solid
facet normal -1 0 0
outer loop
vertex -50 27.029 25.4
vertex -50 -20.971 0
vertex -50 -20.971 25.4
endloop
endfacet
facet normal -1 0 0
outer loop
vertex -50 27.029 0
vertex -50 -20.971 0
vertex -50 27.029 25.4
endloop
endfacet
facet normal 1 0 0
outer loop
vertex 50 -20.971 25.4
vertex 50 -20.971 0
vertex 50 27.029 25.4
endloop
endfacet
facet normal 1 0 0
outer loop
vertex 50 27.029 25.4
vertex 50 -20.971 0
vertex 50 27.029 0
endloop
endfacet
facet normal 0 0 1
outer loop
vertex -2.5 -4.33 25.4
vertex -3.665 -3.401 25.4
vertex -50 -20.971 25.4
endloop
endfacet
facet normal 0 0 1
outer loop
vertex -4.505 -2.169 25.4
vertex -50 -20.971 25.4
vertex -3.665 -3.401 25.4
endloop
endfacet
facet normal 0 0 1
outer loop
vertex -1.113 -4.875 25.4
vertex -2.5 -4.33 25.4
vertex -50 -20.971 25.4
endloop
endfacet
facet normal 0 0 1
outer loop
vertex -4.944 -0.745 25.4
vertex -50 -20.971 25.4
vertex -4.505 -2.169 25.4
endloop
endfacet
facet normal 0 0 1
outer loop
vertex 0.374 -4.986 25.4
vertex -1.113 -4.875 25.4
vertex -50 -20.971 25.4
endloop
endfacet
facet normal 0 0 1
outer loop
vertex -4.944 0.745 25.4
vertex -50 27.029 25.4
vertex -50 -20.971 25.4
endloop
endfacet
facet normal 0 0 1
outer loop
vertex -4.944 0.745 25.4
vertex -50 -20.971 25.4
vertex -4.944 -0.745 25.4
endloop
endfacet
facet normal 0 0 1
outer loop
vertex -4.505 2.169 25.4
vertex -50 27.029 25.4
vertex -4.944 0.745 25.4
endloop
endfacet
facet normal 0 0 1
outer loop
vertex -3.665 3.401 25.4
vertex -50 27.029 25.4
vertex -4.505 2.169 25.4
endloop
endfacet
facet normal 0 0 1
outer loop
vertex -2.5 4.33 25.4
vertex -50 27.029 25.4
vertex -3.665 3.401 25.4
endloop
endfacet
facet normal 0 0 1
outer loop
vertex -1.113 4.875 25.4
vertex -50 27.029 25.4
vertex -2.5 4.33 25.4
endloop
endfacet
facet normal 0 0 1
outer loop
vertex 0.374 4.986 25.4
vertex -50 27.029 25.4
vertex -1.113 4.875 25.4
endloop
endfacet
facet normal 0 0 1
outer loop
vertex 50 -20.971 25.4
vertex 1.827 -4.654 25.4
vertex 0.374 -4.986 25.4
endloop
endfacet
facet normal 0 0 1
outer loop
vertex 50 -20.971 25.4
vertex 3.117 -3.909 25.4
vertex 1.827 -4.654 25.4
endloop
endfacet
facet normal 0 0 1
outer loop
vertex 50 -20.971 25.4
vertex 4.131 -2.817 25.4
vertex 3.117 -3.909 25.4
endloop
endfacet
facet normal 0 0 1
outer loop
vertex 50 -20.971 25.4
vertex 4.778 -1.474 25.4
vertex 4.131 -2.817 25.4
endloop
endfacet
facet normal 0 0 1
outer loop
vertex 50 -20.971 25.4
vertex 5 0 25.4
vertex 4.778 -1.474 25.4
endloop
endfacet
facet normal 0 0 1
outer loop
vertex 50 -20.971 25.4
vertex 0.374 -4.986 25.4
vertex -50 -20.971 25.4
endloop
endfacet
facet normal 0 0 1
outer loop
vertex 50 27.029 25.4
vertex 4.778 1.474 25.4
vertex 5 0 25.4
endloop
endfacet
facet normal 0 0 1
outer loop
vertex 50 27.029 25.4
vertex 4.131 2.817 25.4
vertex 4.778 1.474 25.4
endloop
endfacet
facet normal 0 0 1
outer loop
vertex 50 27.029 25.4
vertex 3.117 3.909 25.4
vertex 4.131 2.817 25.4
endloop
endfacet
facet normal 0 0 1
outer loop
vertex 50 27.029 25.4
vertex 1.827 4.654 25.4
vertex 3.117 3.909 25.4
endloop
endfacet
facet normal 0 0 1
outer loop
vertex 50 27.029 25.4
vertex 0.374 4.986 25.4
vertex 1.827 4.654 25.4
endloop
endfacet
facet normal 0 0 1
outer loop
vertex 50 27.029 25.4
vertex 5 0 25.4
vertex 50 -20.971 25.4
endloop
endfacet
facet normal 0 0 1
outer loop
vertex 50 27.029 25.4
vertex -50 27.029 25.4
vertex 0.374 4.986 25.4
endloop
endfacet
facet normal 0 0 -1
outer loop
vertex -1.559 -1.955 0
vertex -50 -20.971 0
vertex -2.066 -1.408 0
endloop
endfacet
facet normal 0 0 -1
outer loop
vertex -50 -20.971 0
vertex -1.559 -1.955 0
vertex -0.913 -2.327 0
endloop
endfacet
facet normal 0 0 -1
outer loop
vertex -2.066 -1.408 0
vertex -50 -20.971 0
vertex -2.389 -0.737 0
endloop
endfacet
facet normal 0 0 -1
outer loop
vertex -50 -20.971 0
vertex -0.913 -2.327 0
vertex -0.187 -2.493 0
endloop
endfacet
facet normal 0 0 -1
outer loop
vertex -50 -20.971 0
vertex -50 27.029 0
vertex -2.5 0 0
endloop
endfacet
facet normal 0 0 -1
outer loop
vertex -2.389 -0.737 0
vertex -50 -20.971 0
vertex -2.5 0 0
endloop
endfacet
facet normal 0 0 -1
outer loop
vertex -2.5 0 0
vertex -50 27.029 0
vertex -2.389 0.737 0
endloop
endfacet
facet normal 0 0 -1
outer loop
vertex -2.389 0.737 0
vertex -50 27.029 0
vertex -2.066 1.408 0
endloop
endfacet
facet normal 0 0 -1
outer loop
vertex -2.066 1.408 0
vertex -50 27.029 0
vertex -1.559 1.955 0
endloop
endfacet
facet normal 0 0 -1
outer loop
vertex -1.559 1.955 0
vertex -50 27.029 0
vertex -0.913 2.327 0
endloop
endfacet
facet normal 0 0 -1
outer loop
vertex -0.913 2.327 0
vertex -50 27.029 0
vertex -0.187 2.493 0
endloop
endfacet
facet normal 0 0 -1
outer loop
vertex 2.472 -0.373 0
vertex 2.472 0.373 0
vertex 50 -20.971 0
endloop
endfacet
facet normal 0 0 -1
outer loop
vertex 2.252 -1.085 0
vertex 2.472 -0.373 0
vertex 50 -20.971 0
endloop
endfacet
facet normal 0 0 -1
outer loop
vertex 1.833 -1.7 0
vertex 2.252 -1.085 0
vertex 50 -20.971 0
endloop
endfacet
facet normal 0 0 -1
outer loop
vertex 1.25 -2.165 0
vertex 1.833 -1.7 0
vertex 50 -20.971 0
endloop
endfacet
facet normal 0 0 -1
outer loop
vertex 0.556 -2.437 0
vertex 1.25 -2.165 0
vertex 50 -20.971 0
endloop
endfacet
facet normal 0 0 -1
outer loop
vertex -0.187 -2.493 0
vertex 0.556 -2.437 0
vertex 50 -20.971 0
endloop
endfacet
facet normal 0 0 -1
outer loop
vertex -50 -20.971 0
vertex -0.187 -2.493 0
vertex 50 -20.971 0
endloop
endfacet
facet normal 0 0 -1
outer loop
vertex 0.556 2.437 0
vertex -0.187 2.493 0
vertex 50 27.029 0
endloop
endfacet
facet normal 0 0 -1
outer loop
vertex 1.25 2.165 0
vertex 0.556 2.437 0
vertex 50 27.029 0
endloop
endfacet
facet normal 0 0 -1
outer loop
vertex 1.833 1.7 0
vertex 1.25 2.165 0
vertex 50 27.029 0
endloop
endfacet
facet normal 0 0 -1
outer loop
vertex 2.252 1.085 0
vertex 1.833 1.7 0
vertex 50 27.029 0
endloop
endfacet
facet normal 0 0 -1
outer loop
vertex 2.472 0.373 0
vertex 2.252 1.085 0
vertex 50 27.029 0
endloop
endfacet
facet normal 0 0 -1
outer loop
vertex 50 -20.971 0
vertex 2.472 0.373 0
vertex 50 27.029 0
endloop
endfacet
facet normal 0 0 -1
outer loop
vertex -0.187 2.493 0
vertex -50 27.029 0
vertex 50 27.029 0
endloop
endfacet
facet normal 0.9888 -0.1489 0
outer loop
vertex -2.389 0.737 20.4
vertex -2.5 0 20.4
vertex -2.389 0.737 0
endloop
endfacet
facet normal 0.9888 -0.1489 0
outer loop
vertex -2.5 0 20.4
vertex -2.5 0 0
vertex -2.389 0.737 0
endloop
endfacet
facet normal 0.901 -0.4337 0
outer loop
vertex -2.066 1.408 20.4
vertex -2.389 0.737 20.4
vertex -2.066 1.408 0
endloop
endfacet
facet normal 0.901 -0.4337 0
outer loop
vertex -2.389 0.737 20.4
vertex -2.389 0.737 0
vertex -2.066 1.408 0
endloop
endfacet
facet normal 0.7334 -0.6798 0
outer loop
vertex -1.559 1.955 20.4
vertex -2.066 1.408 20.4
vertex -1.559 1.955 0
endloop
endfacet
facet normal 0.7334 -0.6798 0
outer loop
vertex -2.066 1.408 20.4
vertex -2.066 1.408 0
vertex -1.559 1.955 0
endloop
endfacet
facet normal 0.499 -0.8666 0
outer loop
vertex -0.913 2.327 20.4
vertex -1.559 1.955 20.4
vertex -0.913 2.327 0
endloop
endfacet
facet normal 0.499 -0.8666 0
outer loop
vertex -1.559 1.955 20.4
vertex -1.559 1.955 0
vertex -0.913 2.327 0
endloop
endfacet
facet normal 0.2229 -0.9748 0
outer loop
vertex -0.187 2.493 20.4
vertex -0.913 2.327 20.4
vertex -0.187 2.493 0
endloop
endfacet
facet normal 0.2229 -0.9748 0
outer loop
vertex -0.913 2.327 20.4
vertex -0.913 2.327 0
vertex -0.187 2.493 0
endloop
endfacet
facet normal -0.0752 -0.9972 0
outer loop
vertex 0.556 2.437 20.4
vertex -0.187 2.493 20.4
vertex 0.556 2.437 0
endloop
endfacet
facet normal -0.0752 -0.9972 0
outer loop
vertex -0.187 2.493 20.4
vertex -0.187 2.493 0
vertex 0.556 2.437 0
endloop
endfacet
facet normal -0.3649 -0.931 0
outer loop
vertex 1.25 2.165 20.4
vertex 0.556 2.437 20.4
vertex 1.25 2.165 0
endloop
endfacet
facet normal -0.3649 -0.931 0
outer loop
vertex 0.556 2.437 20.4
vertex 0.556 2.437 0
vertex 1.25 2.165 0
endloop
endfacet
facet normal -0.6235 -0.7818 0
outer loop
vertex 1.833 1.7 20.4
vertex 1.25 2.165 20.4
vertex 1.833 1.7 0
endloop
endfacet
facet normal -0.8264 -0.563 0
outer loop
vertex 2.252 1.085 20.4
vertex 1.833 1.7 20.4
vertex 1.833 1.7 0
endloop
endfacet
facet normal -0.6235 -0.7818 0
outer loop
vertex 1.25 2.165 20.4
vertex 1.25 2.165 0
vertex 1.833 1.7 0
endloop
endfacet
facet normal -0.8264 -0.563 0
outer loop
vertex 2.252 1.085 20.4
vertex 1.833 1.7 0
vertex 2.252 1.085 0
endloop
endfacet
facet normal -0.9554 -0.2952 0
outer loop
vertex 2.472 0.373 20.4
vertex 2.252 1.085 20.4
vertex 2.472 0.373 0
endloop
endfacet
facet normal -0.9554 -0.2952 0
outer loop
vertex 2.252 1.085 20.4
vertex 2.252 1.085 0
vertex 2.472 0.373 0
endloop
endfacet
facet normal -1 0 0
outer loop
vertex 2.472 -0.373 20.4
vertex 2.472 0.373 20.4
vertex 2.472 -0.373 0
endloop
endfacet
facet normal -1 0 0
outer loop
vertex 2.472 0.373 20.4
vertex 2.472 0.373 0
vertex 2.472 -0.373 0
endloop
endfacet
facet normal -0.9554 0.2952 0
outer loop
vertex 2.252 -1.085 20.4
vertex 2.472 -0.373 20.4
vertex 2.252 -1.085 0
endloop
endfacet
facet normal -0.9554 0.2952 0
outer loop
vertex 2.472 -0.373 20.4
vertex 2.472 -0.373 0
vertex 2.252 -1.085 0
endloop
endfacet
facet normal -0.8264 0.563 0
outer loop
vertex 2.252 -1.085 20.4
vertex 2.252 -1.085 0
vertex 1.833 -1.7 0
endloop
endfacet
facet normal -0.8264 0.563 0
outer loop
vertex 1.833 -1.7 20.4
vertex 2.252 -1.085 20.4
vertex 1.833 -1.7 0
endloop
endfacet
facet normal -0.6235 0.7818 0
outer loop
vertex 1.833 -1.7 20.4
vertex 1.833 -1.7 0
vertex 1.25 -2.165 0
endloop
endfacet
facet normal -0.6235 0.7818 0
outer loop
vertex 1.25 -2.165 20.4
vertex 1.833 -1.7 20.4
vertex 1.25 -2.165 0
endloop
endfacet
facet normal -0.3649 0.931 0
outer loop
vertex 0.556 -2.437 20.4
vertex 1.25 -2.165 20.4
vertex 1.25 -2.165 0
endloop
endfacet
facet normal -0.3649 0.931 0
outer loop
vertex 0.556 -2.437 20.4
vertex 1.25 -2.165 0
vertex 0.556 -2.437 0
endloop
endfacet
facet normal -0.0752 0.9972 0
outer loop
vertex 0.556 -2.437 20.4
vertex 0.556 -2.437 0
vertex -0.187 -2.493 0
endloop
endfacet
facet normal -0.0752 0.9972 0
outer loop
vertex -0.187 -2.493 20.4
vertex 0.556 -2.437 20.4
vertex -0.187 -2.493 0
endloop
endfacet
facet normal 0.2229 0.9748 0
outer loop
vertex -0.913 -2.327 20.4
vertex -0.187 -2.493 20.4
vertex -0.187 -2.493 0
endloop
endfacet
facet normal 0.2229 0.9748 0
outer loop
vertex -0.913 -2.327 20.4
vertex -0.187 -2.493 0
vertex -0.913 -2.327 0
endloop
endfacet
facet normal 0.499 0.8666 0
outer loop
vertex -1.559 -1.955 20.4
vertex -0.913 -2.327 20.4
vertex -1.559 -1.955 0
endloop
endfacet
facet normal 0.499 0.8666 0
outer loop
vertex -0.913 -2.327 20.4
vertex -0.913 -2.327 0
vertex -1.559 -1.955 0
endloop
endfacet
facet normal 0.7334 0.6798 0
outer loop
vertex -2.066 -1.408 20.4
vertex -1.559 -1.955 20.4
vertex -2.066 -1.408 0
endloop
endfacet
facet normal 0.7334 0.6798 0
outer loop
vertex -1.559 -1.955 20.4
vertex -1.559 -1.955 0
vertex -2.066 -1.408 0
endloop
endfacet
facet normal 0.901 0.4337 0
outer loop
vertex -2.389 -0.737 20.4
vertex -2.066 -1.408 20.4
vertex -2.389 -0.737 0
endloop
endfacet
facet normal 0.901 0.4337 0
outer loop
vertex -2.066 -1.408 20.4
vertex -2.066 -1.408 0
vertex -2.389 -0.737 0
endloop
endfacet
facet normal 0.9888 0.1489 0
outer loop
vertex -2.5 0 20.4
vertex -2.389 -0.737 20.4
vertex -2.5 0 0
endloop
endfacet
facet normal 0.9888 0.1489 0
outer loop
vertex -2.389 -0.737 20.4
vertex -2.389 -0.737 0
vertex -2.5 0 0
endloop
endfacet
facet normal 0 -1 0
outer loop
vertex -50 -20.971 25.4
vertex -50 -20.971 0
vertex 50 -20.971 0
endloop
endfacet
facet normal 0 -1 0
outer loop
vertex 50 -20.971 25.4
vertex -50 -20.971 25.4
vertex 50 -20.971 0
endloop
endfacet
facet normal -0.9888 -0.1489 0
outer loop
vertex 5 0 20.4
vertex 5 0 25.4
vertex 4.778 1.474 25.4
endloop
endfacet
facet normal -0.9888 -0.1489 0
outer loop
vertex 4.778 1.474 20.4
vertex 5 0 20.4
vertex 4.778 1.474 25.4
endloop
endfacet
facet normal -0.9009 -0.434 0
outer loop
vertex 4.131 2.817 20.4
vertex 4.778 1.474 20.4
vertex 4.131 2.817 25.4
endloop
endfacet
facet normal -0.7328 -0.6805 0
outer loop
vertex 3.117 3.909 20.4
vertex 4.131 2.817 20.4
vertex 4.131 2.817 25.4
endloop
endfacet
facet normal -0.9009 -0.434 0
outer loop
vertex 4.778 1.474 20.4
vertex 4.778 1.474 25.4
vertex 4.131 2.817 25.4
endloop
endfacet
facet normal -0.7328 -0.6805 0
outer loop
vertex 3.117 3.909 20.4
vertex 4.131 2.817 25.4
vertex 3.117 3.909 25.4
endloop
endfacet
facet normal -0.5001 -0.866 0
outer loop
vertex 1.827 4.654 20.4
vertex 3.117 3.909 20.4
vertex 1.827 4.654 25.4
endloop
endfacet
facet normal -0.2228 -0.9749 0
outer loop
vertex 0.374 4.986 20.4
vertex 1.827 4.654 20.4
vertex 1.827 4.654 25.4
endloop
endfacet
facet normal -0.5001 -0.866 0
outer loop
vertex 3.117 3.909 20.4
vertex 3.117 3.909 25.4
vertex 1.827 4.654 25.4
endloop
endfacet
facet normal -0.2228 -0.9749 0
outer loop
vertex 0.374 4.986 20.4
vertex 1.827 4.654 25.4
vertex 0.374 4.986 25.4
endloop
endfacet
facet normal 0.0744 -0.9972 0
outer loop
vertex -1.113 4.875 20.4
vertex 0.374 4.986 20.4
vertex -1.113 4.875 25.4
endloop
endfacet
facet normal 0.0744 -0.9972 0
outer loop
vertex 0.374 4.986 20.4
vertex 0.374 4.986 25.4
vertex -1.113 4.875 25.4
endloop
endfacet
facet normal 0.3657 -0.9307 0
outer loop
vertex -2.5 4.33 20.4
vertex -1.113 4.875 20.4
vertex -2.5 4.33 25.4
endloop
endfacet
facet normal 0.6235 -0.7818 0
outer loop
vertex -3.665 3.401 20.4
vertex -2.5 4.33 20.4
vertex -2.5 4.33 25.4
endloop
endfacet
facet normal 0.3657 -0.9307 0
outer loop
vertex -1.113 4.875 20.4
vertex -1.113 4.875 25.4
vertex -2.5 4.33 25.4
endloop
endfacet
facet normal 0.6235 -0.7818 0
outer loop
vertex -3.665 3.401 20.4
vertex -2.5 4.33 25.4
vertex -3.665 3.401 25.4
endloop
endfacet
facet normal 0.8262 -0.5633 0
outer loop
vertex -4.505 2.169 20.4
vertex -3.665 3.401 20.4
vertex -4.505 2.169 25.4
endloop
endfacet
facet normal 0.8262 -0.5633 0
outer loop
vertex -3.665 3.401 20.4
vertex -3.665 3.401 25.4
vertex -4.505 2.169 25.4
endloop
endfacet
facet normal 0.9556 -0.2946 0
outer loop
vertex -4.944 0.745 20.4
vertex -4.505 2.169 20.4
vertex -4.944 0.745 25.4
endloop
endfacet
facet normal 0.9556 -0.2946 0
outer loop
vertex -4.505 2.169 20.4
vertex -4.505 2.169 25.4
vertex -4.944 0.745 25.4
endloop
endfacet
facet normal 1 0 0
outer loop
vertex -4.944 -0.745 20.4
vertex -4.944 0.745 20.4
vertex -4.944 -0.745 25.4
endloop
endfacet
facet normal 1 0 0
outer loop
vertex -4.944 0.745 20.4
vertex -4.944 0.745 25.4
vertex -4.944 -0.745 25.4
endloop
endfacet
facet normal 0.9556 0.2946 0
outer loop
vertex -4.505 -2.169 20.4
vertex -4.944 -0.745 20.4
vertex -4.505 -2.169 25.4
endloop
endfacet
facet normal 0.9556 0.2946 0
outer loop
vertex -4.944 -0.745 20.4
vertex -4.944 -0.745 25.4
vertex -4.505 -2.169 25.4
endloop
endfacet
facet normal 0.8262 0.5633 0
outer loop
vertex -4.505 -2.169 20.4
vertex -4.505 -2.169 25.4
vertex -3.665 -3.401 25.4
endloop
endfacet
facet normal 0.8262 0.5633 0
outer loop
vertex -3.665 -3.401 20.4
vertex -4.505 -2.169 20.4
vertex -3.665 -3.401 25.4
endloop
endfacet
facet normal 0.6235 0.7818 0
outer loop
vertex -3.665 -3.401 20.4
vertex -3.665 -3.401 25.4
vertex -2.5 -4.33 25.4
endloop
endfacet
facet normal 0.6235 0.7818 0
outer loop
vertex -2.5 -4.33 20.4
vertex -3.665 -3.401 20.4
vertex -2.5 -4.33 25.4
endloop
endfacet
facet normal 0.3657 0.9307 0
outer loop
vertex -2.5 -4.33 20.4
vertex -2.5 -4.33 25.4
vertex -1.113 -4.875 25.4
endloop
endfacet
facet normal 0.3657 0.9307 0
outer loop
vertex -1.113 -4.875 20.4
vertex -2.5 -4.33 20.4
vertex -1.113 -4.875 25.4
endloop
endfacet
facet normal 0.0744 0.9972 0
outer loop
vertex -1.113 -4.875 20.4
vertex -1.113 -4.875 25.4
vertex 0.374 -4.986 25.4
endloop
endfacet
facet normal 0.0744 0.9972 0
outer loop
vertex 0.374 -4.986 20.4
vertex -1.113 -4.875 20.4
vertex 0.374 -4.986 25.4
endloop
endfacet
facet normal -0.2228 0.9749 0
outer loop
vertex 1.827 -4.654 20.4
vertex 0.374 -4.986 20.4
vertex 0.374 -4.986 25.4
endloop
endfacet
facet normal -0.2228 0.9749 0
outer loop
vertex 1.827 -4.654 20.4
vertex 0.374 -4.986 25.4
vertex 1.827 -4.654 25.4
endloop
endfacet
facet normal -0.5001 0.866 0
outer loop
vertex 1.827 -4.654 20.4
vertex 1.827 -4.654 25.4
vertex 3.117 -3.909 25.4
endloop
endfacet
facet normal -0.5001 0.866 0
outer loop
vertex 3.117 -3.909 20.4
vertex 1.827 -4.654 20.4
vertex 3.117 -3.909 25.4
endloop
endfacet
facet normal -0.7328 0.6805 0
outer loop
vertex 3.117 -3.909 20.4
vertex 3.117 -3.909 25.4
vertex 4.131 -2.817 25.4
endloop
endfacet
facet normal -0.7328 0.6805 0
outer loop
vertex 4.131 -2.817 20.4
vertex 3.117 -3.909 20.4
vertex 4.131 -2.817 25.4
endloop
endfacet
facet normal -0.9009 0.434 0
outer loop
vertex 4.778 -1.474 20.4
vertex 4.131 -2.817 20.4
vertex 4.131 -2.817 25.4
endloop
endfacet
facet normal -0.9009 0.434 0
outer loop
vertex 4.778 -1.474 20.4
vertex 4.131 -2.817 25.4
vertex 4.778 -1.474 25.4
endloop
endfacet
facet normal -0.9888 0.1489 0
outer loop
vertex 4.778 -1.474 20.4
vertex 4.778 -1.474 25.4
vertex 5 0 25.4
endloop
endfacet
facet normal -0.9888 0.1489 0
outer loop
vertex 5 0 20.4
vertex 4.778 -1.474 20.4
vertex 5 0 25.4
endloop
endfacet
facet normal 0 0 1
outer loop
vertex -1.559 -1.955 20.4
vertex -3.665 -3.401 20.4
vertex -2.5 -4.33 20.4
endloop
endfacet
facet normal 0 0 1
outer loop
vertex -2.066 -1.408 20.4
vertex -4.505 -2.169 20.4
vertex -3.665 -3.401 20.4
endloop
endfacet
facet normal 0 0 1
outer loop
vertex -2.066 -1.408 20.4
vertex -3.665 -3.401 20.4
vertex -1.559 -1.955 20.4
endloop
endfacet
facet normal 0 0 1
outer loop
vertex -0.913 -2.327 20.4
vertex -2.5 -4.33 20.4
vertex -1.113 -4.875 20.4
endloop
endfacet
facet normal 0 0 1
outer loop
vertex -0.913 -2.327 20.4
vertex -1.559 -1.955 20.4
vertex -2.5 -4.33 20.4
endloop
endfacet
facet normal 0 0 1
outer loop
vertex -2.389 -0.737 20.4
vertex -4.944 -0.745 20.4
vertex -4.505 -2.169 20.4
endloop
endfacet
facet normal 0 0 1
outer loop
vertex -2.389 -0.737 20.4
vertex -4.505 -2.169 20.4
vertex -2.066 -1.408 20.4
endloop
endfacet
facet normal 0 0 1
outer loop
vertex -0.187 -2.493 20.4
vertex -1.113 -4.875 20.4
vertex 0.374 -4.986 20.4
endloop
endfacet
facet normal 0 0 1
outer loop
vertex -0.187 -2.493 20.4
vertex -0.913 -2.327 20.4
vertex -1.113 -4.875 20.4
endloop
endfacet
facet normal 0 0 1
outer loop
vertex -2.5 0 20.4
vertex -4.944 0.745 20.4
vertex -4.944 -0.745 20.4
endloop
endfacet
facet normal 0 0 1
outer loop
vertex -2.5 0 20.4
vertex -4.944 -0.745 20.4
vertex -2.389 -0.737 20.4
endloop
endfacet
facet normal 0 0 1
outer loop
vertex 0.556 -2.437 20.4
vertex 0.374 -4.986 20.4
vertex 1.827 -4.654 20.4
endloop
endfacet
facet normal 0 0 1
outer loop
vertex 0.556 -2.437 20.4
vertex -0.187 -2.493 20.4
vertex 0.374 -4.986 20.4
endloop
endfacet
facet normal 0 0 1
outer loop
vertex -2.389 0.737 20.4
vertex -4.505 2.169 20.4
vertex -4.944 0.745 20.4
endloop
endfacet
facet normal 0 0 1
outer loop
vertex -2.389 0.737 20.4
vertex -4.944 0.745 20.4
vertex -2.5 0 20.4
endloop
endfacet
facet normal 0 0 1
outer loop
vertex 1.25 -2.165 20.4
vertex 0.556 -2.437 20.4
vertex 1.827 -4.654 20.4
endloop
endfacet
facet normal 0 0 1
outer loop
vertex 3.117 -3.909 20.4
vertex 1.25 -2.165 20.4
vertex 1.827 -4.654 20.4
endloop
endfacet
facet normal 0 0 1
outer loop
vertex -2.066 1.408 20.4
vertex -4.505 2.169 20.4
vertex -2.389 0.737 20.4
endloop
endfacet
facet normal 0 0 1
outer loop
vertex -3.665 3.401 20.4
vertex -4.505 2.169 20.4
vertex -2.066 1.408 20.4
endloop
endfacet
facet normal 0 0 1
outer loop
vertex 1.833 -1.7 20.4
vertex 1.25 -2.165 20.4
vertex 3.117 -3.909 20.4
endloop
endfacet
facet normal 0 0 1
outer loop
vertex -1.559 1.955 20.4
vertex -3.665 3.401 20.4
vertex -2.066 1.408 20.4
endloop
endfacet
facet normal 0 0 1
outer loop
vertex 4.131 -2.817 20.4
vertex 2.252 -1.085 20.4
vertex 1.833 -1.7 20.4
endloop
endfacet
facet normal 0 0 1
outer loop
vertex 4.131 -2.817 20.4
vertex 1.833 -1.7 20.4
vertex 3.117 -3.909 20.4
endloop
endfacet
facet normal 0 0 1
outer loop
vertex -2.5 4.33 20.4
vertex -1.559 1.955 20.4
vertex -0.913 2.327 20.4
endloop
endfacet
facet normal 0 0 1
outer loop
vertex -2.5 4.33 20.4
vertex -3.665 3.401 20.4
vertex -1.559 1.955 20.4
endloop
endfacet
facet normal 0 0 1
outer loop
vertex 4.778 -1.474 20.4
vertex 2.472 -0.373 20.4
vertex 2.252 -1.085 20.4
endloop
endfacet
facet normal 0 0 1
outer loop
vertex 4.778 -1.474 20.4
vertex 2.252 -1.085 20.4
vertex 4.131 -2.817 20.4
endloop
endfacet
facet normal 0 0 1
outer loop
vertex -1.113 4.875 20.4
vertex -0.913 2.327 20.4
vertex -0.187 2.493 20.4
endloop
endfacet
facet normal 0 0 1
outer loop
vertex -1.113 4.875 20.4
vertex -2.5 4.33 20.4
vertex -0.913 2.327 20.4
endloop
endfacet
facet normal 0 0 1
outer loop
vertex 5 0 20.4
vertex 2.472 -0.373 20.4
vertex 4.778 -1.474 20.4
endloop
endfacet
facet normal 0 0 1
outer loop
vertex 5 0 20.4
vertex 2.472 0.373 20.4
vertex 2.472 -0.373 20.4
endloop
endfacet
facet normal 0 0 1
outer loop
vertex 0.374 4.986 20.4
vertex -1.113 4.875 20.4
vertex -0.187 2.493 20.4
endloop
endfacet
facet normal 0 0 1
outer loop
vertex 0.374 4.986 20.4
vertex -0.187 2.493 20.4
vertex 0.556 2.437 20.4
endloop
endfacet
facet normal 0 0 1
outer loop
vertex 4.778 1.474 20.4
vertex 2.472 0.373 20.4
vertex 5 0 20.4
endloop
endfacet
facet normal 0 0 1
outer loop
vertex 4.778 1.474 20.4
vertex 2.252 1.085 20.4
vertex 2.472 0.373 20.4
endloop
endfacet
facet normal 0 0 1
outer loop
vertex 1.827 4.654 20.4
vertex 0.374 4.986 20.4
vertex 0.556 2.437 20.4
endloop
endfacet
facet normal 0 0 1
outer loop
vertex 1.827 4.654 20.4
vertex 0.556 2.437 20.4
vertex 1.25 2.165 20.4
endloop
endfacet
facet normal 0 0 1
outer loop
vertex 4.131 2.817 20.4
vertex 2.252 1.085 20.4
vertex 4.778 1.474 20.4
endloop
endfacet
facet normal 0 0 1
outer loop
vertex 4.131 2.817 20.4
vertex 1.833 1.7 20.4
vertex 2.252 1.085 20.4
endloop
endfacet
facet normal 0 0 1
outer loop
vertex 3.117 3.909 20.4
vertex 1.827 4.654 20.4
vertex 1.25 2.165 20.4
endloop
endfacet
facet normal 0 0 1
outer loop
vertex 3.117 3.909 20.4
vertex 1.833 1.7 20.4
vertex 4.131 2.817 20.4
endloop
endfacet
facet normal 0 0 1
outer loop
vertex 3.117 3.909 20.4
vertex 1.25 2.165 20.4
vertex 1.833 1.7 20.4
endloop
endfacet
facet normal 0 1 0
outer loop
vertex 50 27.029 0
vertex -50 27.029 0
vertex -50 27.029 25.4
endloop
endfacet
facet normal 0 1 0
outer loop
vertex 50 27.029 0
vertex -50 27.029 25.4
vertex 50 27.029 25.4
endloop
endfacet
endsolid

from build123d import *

# Parameters (mm, degrees)
F0_W           = 100
F0_H           = 48
F1_DEPTH       = 25.4
F3_D           = 5
F3_CBORE_D     = 10
F3_CBORE_DEPTH = 5


with BuildPart() as f1:
    # F0 (on Top) → F1 (new body)
    with BuildSketch(Plane.XY):
        with Locations((0, 3.029243)):
            Rectangle(F0_W, F0_H)
    extrude(amount=F1_DEPTH)

    # F3 (through all)
    with Locations(Plane.XY.offset(25.4)):
        with Locations((0, 0)):
            CounterBoreHole(F3_D / 2, F3_CBORE_D / 2, F3_CBORE_DEPTH)


solid = f1.part
